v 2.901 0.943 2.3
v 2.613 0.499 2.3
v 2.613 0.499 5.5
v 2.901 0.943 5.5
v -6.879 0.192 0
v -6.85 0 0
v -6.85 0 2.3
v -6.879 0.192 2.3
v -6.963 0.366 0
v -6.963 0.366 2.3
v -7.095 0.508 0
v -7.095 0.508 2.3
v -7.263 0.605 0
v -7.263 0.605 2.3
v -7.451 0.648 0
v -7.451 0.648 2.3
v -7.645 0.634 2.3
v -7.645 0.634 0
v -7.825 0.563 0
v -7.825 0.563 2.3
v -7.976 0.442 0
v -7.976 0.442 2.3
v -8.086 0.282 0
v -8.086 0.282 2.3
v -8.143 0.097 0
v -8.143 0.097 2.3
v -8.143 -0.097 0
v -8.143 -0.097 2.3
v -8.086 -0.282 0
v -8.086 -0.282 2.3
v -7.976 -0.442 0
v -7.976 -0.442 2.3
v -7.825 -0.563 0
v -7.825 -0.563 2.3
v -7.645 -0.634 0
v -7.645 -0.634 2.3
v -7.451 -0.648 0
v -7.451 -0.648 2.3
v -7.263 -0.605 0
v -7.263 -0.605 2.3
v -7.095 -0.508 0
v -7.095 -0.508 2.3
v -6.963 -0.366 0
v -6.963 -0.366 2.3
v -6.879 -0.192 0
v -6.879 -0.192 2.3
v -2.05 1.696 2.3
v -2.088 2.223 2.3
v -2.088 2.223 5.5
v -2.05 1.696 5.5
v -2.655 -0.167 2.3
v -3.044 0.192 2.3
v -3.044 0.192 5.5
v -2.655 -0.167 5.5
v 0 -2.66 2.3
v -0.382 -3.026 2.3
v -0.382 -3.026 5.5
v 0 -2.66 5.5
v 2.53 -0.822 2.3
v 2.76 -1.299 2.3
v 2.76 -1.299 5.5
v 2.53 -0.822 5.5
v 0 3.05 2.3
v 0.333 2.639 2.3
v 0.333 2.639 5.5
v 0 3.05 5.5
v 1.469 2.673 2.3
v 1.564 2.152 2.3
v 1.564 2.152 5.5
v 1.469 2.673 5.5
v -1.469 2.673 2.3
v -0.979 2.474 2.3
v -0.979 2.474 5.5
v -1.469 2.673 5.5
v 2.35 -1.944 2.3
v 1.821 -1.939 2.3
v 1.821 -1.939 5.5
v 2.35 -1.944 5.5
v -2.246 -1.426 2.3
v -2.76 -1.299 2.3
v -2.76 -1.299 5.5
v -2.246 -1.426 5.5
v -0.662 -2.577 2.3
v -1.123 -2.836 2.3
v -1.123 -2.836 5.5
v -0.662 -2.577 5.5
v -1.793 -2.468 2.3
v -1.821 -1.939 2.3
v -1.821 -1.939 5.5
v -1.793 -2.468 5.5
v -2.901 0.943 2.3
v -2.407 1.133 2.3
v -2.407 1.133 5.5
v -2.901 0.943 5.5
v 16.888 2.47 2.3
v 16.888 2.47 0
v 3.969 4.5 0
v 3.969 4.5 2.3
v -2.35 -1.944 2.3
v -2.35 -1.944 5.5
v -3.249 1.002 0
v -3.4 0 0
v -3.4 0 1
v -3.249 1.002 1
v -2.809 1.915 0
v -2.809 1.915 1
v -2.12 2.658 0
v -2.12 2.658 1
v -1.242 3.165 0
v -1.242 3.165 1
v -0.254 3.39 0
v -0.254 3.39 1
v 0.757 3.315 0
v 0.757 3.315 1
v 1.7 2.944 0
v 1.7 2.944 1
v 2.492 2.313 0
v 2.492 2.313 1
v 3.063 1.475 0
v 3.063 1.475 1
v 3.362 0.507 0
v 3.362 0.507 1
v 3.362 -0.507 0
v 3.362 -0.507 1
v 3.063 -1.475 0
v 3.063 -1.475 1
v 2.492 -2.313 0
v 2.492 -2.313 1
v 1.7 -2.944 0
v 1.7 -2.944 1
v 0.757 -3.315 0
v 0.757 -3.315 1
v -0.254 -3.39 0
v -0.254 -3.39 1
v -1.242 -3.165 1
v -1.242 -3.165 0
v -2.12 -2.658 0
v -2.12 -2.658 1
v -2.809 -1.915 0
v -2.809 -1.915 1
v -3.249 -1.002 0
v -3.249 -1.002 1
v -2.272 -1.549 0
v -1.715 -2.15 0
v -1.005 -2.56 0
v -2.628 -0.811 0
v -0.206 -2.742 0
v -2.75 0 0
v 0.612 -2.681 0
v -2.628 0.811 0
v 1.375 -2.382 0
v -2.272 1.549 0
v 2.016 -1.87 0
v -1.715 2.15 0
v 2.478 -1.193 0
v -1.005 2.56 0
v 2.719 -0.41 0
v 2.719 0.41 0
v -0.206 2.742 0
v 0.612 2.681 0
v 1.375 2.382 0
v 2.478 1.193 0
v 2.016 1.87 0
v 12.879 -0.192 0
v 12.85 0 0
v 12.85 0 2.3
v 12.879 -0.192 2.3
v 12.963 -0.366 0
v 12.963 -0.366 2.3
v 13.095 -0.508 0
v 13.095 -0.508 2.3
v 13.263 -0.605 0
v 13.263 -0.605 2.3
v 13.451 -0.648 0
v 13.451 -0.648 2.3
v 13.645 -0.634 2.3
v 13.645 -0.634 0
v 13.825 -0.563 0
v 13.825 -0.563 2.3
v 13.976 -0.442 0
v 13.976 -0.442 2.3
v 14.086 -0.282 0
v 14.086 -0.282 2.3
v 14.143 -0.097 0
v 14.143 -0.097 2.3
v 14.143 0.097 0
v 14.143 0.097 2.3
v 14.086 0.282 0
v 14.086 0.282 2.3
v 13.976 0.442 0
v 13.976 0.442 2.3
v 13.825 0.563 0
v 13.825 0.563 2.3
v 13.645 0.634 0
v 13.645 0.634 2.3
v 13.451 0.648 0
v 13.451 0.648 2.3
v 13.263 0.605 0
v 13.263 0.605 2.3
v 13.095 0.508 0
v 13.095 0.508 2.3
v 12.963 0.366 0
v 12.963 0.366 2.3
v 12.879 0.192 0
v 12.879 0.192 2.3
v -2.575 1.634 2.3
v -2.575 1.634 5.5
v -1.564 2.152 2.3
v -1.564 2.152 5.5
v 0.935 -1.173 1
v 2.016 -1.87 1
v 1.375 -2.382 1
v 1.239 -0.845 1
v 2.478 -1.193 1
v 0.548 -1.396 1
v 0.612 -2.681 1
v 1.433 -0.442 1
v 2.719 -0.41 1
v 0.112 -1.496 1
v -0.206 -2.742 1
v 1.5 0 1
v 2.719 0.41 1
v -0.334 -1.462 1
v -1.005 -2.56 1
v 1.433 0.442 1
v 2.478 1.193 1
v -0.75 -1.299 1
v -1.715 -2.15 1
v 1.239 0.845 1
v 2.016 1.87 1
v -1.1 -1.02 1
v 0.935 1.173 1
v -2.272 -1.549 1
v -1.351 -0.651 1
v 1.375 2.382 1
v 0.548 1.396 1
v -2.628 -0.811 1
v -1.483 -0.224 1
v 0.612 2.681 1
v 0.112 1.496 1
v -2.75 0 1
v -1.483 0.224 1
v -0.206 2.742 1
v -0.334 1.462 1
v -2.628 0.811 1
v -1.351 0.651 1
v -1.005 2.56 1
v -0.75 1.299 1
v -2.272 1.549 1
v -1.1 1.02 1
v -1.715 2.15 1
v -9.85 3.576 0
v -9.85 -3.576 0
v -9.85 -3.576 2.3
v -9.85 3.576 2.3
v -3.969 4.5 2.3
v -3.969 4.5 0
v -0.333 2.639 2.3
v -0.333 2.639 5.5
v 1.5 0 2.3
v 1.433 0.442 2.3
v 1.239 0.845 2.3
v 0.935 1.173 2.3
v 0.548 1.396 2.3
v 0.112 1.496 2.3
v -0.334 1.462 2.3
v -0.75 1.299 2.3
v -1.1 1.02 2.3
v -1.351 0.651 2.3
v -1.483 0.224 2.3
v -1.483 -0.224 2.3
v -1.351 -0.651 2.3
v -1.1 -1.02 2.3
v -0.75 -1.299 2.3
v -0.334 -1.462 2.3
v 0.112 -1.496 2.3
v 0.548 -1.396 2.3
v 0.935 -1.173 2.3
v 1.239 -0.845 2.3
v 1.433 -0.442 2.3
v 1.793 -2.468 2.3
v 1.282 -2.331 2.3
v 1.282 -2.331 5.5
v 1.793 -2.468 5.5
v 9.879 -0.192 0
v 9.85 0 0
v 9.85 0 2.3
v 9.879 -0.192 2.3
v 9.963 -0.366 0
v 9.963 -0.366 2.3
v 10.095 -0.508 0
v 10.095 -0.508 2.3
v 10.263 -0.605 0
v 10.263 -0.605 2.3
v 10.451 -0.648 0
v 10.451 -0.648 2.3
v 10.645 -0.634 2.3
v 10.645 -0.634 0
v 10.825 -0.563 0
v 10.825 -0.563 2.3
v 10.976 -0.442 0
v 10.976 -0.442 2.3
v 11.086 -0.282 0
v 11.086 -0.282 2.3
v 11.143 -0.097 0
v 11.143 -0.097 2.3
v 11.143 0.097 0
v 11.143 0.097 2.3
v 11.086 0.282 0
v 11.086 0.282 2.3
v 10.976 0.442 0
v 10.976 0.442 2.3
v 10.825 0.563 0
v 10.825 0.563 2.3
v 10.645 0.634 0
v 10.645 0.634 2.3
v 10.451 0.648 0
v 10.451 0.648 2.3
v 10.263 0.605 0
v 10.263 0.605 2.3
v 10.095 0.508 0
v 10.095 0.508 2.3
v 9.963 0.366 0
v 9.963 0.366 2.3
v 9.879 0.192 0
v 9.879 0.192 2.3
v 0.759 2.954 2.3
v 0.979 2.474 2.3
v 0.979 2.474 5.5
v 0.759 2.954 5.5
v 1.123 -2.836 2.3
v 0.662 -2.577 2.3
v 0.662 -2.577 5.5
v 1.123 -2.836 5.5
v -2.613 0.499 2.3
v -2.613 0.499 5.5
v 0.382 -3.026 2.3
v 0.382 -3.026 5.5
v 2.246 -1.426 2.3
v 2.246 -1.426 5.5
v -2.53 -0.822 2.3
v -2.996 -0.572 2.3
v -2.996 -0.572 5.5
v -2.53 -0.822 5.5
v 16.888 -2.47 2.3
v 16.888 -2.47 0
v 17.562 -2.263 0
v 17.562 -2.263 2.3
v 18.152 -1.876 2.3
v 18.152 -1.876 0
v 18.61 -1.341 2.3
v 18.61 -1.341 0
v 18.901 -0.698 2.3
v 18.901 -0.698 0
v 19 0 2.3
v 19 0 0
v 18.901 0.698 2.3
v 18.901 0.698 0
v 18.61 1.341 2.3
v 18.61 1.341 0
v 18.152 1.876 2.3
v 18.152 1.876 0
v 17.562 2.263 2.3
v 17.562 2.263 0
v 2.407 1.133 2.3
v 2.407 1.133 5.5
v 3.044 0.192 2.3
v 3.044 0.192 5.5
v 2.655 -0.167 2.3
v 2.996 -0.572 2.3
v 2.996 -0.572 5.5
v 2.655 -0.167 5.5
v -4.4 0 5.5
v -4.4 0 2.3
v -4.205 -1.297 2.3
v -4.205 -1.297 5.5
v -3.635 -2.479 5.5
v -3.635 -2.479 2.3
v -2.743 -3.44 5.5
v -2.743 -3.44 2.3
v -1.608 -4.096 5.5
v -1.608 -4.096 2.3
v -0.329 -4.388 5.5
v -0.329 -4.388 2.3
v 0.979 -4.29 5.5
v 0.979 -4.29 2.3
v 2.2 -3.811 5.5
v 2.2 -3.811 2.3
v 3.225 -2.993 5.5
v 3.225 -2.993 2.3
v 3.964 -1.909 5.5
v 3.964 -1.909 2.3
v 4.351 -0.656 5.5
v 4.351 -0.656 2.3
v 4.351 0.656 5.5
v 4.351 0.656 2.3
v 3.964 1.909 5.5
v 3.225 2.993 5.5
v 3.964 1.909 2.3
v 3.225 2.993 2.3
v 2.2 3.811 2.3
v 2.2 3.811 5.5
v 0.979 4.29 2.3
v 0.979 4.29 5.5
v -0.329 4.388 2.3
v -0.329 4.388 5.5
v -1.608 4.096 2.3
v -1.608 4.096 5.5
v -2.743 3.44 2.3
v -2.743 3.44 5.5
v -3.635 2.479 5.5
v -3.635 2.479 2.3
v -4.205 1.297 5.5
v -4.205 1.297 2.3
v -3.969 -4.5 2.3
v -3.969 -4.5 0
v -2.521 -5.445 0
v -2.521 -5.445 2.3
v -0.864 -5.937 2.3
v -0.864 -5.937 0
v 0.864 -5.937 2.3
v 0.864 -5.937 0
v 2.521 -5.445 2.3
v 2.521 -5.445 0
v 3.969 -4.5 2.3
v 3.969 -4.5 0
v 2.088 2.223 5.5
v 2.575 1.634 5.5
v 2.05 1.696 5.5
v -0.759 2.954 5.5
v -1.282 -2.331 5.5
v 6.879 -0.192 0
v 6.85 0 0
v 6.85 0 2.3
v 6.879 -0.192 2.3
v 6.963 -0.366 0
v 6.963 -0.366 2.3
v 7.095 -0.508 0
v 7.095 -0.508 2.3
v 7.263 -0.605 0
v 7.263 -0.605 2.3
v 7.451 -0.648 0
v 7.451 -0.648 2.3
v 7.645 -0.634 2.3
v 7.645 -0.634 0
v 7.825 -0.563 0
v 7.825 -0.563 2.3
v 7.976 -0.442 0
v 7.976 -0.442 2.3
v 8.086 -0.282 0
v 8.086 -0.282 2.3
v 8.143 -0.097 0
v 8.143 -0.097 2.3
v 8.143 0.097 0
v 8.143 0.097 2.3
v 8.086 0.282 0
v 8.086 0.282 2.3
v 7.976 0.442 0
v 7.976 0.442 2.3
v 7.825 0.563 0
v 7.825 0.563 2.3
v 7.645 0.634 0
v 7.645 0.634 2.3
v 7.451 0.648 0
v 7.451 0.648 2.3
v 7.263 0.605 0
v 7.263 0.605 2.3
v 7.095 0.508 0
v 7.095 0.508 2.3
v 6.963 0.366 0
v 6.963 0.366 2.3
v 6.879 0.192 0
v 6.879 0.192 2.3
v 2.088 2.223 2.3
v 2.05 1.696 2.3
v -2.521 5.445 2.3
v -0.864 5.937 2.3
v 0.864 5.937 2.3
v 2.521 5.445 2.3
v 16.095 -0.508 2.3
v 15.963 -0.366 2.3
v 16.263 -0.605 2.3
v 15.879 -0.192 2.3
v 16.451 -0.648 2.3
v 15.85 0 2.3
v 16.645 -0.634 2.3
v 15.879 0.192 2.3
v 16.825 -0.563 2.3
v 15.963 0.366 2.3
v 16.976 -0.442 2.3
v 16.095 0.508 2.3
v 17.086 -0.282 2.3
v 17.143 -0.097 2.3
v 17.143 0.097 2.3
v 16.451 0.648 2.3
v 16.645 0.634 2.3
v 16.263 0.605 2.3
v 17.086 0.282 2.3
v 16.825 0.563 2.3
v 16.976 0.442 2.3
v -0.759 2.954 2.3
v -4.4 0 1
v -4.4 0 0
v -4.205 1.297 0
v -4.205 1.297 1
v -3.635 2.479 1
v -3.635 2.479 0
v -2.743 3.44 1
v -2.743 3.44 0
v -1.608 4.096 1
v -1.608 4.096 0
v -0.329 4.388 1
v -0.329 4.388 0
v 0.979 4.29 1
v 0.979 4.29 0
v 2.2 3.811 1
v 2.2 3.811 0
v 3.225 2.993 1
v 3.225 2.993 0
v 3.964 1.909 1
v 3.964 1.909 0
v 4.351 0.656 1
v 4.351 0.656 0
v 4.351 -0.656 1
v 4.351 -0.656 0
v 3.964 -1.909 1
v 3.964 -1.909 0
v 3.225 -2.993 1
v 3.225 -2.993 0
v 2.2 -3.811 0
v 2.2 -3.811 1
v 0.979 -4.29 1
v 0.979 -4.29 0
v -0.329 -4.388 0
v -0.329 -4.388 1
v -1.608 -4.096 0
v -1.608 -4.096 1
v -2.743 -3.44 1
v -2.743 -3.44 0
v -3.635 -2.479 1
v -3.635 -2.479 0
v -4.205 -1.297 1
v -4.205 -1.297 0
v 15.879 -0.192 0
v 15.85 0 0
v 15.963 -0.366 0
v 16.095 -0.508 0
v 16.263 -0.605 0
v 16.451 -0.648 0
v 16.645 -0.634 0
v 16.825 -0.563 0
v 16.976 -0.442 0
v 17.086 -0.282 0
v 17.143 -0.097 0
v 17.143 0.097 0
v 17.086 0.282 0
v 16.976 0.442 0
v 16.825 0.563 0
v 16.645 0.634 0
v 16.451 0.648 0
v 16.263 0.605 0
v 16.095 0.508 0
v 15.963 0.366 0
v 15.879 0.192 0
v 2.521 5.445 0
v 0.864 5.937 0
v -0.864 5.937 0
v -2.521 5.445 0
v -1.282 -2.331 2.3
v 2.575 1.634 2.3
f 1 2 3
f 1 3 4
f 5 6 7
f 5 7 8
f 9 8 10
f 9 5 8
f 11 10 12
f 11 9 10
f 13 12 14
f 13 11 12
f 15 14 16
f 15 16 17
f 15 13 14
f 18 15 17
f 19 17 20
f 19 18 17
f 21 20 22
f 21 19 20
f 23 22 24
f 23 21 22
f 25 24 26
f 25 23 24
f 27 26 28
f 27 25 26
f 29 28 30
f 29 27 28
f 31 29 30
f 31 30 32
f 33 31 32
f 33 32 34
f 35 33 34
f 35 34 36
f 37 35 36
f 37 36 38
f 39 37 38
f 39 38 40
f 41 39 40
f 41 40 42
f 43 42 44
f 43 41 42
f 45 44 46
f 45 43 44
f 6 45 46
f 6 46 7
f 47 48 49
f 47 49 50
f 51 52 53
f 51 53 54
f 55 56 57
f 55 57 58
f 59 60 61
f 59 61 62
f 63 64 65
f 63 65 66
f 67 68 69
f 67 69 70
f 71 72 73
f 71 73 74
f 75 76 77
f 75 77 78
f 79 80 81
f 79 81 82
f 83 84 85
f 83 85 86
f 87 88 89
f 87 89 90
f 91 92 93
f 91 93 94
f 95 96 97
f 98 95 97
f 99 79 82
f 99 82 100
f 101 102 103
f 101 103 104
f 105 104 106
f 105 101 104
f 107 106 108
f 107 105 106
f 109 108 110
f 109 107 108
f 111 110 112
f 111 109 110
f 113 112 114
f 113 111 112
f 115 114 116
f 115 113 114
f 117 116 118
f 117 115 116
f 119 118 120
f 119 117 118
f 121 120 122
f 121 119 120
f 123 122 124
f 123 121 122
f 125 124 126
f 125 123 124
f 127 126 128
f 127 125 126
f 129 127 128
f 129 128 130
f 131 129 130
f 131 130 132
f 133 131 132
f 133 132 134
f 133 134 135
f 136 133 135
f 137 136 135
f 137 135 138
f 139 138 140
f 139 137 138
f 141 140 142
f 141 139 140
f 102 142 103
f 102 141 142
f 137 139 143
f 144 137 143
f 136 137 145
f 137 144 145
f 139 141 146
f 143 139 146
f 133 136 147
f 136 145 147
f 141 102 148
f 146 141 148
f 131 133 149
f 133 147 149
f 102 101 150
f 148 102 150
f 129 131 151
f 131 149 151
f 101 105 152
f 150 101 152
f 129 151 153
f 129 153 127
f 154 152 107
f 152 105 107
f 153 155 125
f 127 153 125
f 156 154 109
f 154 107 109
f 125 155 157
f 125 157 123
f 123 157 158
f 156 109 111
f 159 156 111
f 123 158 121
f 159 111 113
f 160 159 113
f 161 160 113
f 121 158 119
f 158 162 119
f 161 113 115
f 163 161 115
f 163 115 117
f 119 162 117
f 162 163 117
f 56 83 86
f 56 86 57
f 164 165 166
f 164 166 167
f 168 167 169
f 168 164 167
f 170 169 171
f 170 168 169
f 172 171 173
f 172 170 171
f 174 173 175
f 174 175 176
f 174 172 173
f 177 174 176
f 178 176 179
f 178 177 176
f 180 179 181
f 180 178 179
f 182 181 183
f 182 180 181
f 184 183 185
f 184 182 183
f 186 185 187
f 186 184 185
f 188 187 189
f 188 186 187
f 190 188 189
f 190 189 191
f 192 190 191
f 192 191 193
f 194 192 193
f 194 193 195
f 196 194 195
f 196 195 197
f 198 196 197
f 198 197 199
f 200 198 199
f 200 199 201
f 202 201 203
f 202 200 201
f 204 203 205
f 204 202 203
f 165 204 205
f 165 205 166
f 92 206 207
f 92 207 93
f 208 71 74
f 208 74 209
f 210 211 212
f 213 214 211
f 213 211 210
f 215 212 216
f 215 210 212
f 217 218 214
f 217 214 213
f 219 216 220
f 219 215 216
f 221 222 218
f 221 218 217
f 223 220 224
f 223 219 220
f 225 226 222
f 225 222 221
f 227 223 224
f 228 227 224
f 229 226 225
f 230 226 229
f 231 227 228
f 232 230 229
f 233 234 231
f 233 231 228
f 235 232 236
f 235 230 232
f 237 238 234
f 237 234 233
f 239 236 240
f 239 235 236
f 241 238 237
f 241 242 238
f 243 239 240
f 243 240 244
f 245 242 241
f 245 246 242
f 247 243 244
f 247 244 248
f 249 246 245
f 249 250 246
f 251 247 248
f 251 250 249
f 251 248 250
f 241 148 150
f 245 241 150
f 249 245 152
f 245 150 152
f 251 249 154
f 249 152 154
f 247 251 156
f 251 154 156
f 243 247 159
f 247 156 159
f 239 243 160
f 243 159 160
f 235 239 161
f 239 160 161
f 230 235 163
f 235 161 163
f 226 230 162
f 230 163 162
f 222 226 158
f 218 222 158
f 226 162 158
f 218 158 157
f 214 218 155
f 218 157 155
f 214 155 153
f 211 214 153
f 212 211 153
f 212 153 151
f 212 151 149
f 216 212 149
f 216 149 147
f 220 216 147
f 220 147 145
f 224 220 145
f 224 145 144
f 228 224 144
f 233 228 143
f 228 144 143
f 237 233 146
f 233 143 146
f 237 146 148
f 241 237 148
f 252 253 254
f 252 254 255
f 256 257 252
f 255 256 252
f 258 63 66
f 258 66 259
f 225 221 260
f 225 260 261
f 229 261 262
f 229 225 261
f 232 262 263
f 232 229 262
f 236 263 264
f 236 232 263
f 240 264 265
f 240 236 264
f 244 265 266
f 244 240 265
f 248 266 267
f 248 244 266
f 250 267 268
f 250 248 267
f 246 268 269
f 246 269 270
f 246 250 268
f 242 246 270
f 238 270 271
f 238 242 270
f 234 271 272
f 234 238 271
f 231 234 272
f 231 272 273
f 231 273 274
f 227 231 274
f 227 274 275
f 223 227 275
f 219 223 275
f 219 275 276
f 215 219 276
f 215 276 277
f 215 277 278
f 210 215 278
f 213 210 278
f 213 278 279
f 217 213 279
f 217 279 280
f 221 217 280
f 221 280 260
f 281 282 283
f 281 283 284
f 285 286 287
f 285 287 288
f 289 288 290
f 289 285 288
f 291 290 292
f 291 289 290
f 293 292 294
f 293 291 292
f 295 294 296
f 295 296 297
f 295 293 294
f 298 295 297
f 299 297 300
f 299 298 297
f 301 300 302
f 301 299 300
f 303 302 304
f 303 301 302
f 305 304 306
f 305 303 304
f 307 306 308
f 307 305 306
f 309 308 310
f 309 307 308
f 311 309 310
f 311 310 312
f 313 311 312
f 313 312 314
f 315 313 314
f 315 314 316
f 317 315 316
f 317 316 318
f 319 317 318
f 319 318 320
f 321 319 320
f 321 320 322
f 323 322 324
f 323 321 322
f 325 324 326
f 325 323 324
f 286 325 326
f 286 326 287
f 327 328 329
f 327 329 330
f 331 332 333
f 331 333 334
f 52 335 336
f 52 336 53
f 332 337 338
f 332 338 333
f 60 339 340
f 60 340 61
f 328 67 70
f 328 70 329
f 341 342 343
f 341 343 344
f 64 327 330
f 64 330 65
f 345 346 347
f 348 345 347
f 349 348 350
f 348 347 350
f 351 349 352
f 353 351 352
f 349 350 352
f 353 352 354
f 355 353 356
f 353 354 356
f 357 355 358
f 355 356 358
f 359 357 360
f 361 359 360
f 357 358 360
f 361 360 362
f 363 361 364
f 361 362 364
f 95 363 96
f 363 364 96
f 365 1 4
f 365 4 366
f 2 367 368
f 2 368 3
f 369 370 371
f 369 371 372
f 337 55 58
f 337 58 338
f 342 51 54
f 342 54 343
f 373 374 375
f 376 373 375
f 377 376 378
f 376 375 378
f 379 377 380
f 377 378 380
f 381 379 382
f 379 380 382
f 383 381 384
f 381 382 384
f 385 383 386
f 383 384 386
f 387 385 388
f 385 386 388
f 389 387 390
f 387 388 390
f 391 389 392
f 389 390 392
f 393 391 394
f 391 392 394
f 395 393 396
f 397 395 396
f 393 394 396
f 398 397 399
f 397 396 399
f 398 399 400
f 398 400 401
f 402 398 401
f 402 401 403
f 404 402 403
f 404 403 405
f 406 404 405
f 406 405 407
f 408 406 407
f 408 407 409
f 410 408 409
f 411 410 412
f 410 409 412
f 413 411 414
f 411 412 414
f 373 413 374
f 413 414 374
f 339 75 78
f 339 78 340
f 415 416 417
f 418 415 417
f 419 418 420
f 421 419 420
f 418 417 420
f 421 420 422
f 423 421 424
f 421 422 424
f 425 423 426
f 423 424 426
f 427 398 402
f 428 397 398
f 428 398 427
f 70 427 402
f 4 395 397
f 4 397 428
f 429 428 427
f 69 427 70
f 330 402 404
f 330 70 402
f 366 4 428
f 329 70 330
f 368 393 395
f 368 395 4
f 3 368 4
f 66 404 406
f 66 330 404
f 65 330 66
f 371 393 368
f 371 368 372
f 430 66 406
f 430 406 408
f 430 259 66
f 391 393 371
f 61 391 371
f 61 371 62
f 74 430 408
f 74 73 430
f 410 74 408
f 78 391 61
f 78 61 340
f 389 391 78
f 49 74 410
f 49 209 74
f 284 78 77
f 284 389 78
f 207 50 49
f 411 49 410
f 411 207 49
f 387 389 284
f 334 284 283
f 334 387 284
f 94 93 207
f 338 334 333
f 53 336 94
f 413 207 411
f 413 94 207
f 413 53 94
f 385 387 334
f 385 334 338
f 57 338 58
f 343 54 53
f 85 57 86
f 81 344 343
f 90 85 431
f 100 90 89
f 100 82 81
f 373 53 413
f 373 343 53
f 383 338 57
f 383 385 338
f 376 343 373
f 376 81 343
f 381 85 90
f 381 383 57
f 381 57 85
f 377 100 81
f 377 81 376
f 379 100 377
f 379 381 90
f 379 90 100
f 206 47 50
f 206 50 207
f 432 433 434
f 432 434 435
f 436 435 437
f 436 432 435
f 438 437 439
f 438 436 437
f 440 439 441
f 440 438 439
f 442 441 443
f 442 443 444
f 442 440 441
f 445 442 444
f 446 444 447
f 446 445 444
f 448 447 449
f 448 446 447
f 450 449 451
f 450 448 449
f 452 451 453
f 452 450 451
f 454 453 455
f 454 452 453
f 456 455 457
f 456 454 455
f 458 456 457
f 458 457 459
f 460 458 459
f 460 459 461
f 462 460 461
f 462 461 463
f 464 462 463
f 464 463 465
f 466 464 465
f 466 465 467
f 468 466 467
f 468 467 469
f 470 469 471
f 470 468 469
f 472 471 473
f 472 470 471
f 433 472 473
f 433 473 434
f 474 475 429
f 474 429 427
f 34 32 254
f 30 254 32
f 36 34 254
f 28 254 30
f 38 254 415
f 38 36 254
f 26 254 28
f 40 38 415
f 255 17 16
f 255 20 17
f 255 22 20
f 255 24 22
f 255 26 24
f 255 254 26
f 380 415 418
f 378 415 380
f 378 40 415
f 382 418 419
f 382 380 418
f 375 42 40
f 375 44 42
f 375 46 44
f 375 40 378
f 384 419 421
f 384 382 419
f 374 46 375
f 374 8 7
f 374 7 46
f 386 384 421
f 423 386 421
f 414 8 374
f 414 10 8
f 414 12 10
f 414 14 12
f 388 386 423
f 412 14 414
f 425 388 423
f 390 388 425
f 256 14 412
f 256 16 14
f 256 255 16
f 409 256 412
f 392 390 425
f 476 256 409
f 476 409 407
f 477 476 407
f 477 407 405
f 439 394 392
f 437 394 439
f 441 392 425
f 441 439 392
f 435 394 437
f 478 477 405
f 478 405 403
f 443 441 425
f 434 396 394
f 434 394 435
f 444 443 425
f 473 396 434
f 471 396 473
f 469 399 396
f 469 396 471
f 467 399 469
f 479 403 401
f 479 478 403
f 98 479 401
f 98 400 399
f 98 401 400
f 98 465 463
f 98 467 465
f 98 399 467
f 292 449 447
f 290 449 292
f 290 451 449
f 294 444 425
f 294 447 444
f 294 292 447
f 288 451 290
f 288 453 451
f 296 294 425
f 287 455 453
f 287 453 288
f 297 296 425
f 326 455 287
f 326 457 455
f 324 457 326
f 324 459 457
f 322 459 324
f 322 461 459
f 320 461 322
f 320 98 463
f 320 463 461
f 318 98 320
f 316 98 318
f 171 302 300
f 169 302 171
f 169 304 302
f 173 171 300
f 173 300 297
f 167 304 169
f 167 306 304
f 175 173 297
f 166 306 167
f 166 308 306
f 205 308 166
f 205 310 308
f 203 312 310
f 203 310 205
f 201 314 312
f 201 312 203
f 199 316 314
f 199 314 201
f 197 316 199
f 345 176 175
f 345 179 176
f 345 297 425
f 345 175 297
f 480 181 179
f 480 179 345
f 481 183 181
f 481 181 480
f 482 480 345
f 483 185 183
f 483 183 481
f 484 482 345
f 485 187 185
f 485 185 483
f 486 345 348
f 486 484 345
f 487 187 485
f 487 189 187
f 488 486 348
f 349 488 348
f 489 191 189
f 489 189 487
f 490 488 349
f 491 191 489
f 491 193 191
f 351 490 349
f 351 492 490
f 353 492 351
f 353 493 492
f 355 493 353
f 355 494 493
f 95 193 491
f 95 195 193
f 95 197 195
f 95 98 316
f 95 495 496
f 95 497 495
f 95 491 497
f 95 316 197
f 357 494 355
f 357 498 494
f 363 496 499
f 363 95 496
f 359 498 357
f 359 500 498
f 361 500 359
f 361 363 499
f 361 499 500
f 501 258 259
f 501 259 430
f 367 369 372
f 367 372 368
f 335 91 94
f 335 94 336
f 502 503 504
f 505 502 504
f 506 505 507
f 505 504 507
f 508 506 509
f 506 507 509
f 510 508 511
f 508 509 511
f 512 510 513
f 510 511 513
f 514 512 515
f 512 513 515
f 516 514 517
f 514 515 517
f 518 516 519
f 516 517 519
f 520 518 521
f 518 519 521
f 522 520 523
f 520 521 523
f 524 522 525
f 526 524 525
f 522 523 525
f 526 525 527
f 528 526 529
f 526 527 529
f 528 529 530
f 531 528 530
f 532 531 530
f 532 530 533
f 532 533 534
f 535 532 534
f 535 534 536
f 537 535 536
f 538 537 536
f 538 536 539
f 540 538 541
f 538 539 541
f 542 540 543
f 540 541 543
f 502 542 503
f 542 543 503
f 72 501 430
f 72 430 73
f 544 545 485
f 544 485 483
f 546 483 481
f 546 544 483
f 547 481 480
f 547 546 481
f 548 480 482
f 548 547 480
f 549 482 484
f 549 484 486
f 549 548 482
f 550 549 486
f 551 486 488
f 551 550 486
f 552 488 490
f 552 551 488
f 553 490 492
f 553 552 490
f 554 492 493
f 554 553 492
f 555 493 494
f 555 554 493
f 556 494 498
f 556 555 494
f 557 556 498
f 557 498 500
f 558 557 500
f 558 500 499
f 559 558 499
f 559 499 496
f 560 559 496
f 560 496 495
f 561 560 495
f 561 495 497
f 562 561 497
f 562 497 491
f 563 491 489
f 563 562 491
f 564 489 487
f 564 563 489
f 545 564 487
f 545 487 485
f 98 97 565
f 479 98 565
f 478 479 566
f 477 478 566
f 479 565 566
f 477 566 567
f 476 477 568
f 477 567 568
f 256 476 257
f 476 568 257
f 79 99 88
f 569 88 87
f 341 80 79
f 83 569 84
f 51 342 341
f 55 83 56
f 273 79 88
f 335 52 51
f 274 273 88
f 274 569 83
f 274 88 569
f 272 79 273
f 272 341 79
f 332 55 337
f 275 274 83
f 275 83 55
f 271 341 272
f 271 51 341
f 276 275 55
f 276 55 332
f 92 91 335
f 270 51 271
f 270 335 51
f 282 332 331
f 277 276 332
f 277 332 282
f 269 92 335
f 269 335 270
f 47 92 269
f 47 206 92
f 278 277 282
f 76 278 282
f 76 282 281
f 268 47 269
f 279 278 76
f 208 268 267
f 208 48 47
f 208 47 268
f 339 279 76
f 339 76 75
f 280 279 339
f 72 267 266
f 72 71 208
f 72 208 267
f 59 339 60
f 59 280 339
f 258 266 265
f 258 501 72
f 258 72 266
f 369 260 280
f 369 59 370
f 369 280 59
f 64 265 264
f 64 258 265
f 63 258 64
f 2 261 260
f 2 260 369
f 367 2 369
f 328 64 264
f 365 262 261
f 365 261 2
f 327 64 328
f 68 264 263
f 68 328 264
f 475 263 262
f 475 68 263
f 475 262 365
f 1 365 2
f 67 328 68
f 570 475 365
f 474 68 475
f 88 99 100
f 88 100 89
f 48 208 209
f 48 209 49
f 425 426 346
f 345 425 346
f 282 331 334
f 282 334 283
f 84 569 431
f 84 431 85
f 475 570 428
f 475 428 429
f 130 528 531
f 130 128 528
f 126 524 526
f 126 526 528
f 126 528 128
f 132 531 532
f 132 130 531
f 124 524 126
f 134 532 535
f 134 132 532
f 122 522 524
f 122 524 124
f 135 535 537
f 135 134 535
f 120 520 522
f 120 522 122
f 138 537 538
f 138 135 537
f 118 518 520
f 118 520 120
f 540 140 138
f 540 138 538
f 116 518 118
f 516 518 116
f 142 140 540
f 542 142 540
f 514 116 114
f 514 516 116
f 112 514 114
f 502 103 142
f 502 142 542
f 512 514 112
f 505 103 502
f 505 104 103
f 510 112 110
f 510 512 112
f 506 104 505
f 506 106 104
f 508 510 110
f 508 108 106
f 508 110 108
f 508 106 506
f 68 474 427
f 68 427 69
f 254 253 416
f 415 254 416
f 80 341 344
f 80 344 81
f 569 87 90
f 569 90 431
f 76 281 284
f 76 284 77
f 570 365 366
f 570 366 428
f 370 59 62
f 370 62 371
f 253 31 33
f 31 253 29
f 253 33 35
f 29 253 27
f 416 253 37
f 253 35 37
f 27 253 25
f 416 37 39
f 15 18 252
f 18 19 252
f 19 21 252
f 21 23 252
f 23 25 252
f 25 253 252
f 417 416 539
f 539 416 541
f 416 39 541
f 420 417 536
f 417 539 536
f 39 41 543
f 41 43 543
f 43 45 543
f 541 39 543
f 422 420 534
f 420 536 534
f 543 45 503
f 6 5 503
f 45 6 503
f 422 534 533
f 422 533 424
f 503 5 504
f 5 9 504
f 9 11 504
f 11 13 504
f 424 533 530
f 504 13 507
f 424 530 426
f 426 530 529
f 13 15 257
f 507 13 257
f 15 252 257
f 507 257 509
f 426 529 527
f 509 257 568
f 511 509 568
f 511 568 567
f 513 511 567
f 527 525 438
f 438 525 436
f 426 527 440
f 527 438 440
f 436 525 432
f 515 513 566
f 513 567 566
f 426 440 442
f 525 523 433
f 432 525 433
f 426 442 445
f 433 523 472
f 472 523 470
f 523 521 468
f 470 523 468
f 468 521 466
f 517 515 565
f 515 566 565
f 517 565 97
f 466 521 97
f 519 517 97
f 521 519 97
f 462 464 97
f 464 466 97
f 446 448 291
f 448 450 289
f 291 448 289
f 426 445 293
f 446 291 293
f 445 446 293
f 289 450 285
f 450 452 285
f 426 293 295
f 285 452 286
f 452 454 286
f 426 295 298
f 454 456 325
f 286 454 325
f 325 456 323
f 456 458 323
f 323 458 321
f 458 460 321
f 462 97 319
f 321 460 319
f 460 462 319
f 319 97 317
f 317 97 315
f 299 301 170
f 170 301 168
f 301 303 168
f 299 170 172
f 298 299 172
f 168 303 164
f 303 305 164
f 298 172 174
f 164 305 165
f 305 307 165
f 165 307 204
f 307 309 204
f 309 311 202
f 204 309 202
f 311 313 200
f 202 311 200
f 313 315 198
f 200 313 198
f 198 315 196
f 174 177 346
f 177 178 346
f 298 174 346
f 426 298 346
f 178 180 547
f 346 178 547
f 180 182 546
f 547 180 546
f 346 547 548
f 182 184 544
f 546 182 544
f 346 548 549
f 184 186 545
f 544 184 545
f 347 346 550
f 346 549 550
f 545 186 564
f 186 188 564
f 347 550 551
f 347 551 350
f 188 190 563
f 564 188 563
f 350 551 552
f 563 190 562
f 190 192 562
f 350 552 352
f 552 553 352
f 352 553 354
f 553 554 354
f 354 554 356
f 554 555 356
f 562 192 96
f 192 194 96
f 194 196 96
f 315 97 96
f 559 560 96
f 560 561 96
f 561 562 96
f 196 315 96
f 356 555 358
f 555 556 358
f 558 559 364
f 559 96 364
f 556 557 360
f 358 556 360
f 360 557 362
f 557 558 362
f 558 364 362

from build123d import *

# Parameters (mm, degrees)
SKETCH_1_R          = 0.65
SKETCH_1_R_2        = 1.5
EXTRUDE_1_DEPTH     = 2.3
SKETCH_2_R          = 4.4
EXTRUDE_2_DEPTH     = 3.2
SKETCH_3_R          = 4.4
SKETCH_3_R_2        = 3.4
SKETCH_3_R_3        = 2.75
SKETCH_3_R_4        = 1.5
CUT_EXTRUDE_1_DEPTH = 1
SKETCH1_W           = 12.345584807
SKETCH1_H           = 16.477608666
CUT_EXTRUDE2_DEPTH  = 10


with BuildPart() as part:
    # Эскиз1 → Бобышка-Вытянуть1 (new body)
    with BuildSketch(Plane.XY):
        with BuildLine():
            Line((-3.968626967, 4.5), (-16.888114198, 2.469689731))
            ThreePointArc((-16.888114198, 2.469689731), (-19, 0), (-16.888114198, -2.469689731))
            Line((-16.888114198, -2.469689731), (-3.968626967, -4.5))
            ThreePointArc((-3.968626967, -4.5), (0, -6), (3.968626967, -4.5))
            Line((3.968626967, -4.5), (16.888114198, -2.469689731))
            ThreePointArc((16.888114198, -2.469689731), (19, 0), (16.888114198, 2.469689731))
            Line((16.888114198, 2.469689731), (3.968626967, 4.5))
            ThreePointArc((3.968626967, 4.5), (0, 6), (-3.968626967, 4.5))
        make_face()
        with Locations((-16.5, 0)):
            Circle(SKETCH_1_R, mode=Mode.SUBTRACT)
        with Locations((-13.5, 0)):
            Circle(SKETCH_1_R, mode=Mode.SUBTRACT)
        with Locations((-10.5, 0)):
            Circle(SKETCH_1_R, mode=Mode.SUBTRACT)
        with Locations((-7.5, 0)):
            Circle(SKETCH_1_R, mode=Mode.SUBTRACT)
        with Locations(Location((16.5, 0, 0), (0, 0, 180))):
            Circle(SKETCH_1_R, mode=Mode.SUBTRACT)
        with Locations(Location((7.5, 0, 0), (0, 0, 180))):
            Circle(SKETCH_1_R, mode=Mode.SUBTRACT)
        with Locations(Location((10.5, 0, 0), (0, 0, 180))):
            Circle(SKETCH_1_R, mode=Mode.SUBTRACT)
        with Locations(Location((13.5, 0, 0), (0, 0, 180))):
            Circle(SKETCH_1_R, mode=Mode.SUBTRACT)
        Circle(SKETCH_1_R_2, mode=Mode.SUBTRACT)
    extrude(amount=EXTRUDE_1_DEPTH)

    # Эскиз2 → Бобышка-Вытянуть2 (add)
    with BuildSketch(Plane.XY.offset(2.3)):
        with Locations(Location((0, 0, 0), (0, 0, 180))):
            Circle(SKETCH_2_R)
        Polygon((0.333439775, 2.639447604), (0, 3.05), (-0.333439775, 2.639447604), (-0.758504156, 2.954178641), (-0.979368078, 2.473601404), (-1.469348706, 2.672735374), (-1.563759083, 2.15232973), (-2.087868673, 2.223354314), (-2.049893354, 1.695819264), (-2.575200173, 1.634271725), (-2.407225286, 1.132754236), (-2.900722375, 0.942501833), (-2.6133024, 0.498514094), (-3.043981522, 0.191511085), (-2.655176114, -0.167049522), (-2.995976115, -0.571513009), (-2.530215347, -0.822116802), (-2.75972251, -1.298626839), (-2.246271844, -1.42552746), (-2.35006539, -1.944143169), (-1.821186821, -1.939366985), (-1.792745019, -2.467501833), (-1.281669931, -2.33134895), (-1.122779886, -2.835818282), (-0.661621006, -2.576843686), (-0.382266362, -3.025949839), (0, -2.660425857), (0.382266362, -3.025949839), (0.661621006, -2.576843686), (1.122779886, -2.835818282), (1.281669931, -2.33134895), (1.792745019, -2.467501833), (1.821186821, -1.939366985), (2.35006539, -1.944143169), (2.246271844, -1.42552746), (2.75972251, -1.298626839), (2.530215347, -0.822116802), (2.995976115, -0.571513009), (2.655176114, -0.167049522), (3.043981522, 0.191511085), (2.6133024, 0.498514094), (2.900722375, 0.942501833), (2.407225286, 1.132754236), (2.575200173, 1.634271725), (2.049893354, 1.695819264), (2.087868673, 2.223354314), (1.563759083, 2.15232973), (1.469348706, 2.672735374), (0.979368078, 2.473601404), (0.758504156, 2.954178641), align=None, mode=Mode.SUBTRACT)
    extrude(amount=EXTRUDE_2_DEPTH)

    # Эскиз3 → Вырез-Вытянуть1 (cut)
    # profile 1 of 2: a face of its own
    with BuildSketch(Plane(origin=(0, 0, 0), x_dir=(-1, 0, 0), z_dir=(0, 0, -1))):
        Circle(SKETCH_3_R)
        Circle(SKETCH_3_R_2, mode=Mode.SUBTRACT)
    # profile 2 of 2: a face of its own
    with BuildSketch(Plane(origin=(0, 0, 0), x_dir=(-1, 0, 0), z_dir=(0, 0, -1))):
        Circle(SKETCH_3_R_3)
        Circle(SKETCH_3_R_4, mode=Mode.SUBTRACT)
    extrude(amount=-CUT_EXTRUDE_1_DEPTH, mode=Mode.SUBTRACT)

    # Sketch1 → Cut-Extrude2 (cut)
    with BuildSketch(Plane(origin=(0, 0, 0), x_dir=(-1, 0, 0), z_dir=(0, 0, -1))):
        with Locations((16.022792404, -0.737803373)):
            Rectangle(SKETCH1_W, SKETCH1_H)
    extrude(amount=-CUT_EXTRUDE2_DEPTH, mode=Mode.SUBTRACT)


solid = part.part
